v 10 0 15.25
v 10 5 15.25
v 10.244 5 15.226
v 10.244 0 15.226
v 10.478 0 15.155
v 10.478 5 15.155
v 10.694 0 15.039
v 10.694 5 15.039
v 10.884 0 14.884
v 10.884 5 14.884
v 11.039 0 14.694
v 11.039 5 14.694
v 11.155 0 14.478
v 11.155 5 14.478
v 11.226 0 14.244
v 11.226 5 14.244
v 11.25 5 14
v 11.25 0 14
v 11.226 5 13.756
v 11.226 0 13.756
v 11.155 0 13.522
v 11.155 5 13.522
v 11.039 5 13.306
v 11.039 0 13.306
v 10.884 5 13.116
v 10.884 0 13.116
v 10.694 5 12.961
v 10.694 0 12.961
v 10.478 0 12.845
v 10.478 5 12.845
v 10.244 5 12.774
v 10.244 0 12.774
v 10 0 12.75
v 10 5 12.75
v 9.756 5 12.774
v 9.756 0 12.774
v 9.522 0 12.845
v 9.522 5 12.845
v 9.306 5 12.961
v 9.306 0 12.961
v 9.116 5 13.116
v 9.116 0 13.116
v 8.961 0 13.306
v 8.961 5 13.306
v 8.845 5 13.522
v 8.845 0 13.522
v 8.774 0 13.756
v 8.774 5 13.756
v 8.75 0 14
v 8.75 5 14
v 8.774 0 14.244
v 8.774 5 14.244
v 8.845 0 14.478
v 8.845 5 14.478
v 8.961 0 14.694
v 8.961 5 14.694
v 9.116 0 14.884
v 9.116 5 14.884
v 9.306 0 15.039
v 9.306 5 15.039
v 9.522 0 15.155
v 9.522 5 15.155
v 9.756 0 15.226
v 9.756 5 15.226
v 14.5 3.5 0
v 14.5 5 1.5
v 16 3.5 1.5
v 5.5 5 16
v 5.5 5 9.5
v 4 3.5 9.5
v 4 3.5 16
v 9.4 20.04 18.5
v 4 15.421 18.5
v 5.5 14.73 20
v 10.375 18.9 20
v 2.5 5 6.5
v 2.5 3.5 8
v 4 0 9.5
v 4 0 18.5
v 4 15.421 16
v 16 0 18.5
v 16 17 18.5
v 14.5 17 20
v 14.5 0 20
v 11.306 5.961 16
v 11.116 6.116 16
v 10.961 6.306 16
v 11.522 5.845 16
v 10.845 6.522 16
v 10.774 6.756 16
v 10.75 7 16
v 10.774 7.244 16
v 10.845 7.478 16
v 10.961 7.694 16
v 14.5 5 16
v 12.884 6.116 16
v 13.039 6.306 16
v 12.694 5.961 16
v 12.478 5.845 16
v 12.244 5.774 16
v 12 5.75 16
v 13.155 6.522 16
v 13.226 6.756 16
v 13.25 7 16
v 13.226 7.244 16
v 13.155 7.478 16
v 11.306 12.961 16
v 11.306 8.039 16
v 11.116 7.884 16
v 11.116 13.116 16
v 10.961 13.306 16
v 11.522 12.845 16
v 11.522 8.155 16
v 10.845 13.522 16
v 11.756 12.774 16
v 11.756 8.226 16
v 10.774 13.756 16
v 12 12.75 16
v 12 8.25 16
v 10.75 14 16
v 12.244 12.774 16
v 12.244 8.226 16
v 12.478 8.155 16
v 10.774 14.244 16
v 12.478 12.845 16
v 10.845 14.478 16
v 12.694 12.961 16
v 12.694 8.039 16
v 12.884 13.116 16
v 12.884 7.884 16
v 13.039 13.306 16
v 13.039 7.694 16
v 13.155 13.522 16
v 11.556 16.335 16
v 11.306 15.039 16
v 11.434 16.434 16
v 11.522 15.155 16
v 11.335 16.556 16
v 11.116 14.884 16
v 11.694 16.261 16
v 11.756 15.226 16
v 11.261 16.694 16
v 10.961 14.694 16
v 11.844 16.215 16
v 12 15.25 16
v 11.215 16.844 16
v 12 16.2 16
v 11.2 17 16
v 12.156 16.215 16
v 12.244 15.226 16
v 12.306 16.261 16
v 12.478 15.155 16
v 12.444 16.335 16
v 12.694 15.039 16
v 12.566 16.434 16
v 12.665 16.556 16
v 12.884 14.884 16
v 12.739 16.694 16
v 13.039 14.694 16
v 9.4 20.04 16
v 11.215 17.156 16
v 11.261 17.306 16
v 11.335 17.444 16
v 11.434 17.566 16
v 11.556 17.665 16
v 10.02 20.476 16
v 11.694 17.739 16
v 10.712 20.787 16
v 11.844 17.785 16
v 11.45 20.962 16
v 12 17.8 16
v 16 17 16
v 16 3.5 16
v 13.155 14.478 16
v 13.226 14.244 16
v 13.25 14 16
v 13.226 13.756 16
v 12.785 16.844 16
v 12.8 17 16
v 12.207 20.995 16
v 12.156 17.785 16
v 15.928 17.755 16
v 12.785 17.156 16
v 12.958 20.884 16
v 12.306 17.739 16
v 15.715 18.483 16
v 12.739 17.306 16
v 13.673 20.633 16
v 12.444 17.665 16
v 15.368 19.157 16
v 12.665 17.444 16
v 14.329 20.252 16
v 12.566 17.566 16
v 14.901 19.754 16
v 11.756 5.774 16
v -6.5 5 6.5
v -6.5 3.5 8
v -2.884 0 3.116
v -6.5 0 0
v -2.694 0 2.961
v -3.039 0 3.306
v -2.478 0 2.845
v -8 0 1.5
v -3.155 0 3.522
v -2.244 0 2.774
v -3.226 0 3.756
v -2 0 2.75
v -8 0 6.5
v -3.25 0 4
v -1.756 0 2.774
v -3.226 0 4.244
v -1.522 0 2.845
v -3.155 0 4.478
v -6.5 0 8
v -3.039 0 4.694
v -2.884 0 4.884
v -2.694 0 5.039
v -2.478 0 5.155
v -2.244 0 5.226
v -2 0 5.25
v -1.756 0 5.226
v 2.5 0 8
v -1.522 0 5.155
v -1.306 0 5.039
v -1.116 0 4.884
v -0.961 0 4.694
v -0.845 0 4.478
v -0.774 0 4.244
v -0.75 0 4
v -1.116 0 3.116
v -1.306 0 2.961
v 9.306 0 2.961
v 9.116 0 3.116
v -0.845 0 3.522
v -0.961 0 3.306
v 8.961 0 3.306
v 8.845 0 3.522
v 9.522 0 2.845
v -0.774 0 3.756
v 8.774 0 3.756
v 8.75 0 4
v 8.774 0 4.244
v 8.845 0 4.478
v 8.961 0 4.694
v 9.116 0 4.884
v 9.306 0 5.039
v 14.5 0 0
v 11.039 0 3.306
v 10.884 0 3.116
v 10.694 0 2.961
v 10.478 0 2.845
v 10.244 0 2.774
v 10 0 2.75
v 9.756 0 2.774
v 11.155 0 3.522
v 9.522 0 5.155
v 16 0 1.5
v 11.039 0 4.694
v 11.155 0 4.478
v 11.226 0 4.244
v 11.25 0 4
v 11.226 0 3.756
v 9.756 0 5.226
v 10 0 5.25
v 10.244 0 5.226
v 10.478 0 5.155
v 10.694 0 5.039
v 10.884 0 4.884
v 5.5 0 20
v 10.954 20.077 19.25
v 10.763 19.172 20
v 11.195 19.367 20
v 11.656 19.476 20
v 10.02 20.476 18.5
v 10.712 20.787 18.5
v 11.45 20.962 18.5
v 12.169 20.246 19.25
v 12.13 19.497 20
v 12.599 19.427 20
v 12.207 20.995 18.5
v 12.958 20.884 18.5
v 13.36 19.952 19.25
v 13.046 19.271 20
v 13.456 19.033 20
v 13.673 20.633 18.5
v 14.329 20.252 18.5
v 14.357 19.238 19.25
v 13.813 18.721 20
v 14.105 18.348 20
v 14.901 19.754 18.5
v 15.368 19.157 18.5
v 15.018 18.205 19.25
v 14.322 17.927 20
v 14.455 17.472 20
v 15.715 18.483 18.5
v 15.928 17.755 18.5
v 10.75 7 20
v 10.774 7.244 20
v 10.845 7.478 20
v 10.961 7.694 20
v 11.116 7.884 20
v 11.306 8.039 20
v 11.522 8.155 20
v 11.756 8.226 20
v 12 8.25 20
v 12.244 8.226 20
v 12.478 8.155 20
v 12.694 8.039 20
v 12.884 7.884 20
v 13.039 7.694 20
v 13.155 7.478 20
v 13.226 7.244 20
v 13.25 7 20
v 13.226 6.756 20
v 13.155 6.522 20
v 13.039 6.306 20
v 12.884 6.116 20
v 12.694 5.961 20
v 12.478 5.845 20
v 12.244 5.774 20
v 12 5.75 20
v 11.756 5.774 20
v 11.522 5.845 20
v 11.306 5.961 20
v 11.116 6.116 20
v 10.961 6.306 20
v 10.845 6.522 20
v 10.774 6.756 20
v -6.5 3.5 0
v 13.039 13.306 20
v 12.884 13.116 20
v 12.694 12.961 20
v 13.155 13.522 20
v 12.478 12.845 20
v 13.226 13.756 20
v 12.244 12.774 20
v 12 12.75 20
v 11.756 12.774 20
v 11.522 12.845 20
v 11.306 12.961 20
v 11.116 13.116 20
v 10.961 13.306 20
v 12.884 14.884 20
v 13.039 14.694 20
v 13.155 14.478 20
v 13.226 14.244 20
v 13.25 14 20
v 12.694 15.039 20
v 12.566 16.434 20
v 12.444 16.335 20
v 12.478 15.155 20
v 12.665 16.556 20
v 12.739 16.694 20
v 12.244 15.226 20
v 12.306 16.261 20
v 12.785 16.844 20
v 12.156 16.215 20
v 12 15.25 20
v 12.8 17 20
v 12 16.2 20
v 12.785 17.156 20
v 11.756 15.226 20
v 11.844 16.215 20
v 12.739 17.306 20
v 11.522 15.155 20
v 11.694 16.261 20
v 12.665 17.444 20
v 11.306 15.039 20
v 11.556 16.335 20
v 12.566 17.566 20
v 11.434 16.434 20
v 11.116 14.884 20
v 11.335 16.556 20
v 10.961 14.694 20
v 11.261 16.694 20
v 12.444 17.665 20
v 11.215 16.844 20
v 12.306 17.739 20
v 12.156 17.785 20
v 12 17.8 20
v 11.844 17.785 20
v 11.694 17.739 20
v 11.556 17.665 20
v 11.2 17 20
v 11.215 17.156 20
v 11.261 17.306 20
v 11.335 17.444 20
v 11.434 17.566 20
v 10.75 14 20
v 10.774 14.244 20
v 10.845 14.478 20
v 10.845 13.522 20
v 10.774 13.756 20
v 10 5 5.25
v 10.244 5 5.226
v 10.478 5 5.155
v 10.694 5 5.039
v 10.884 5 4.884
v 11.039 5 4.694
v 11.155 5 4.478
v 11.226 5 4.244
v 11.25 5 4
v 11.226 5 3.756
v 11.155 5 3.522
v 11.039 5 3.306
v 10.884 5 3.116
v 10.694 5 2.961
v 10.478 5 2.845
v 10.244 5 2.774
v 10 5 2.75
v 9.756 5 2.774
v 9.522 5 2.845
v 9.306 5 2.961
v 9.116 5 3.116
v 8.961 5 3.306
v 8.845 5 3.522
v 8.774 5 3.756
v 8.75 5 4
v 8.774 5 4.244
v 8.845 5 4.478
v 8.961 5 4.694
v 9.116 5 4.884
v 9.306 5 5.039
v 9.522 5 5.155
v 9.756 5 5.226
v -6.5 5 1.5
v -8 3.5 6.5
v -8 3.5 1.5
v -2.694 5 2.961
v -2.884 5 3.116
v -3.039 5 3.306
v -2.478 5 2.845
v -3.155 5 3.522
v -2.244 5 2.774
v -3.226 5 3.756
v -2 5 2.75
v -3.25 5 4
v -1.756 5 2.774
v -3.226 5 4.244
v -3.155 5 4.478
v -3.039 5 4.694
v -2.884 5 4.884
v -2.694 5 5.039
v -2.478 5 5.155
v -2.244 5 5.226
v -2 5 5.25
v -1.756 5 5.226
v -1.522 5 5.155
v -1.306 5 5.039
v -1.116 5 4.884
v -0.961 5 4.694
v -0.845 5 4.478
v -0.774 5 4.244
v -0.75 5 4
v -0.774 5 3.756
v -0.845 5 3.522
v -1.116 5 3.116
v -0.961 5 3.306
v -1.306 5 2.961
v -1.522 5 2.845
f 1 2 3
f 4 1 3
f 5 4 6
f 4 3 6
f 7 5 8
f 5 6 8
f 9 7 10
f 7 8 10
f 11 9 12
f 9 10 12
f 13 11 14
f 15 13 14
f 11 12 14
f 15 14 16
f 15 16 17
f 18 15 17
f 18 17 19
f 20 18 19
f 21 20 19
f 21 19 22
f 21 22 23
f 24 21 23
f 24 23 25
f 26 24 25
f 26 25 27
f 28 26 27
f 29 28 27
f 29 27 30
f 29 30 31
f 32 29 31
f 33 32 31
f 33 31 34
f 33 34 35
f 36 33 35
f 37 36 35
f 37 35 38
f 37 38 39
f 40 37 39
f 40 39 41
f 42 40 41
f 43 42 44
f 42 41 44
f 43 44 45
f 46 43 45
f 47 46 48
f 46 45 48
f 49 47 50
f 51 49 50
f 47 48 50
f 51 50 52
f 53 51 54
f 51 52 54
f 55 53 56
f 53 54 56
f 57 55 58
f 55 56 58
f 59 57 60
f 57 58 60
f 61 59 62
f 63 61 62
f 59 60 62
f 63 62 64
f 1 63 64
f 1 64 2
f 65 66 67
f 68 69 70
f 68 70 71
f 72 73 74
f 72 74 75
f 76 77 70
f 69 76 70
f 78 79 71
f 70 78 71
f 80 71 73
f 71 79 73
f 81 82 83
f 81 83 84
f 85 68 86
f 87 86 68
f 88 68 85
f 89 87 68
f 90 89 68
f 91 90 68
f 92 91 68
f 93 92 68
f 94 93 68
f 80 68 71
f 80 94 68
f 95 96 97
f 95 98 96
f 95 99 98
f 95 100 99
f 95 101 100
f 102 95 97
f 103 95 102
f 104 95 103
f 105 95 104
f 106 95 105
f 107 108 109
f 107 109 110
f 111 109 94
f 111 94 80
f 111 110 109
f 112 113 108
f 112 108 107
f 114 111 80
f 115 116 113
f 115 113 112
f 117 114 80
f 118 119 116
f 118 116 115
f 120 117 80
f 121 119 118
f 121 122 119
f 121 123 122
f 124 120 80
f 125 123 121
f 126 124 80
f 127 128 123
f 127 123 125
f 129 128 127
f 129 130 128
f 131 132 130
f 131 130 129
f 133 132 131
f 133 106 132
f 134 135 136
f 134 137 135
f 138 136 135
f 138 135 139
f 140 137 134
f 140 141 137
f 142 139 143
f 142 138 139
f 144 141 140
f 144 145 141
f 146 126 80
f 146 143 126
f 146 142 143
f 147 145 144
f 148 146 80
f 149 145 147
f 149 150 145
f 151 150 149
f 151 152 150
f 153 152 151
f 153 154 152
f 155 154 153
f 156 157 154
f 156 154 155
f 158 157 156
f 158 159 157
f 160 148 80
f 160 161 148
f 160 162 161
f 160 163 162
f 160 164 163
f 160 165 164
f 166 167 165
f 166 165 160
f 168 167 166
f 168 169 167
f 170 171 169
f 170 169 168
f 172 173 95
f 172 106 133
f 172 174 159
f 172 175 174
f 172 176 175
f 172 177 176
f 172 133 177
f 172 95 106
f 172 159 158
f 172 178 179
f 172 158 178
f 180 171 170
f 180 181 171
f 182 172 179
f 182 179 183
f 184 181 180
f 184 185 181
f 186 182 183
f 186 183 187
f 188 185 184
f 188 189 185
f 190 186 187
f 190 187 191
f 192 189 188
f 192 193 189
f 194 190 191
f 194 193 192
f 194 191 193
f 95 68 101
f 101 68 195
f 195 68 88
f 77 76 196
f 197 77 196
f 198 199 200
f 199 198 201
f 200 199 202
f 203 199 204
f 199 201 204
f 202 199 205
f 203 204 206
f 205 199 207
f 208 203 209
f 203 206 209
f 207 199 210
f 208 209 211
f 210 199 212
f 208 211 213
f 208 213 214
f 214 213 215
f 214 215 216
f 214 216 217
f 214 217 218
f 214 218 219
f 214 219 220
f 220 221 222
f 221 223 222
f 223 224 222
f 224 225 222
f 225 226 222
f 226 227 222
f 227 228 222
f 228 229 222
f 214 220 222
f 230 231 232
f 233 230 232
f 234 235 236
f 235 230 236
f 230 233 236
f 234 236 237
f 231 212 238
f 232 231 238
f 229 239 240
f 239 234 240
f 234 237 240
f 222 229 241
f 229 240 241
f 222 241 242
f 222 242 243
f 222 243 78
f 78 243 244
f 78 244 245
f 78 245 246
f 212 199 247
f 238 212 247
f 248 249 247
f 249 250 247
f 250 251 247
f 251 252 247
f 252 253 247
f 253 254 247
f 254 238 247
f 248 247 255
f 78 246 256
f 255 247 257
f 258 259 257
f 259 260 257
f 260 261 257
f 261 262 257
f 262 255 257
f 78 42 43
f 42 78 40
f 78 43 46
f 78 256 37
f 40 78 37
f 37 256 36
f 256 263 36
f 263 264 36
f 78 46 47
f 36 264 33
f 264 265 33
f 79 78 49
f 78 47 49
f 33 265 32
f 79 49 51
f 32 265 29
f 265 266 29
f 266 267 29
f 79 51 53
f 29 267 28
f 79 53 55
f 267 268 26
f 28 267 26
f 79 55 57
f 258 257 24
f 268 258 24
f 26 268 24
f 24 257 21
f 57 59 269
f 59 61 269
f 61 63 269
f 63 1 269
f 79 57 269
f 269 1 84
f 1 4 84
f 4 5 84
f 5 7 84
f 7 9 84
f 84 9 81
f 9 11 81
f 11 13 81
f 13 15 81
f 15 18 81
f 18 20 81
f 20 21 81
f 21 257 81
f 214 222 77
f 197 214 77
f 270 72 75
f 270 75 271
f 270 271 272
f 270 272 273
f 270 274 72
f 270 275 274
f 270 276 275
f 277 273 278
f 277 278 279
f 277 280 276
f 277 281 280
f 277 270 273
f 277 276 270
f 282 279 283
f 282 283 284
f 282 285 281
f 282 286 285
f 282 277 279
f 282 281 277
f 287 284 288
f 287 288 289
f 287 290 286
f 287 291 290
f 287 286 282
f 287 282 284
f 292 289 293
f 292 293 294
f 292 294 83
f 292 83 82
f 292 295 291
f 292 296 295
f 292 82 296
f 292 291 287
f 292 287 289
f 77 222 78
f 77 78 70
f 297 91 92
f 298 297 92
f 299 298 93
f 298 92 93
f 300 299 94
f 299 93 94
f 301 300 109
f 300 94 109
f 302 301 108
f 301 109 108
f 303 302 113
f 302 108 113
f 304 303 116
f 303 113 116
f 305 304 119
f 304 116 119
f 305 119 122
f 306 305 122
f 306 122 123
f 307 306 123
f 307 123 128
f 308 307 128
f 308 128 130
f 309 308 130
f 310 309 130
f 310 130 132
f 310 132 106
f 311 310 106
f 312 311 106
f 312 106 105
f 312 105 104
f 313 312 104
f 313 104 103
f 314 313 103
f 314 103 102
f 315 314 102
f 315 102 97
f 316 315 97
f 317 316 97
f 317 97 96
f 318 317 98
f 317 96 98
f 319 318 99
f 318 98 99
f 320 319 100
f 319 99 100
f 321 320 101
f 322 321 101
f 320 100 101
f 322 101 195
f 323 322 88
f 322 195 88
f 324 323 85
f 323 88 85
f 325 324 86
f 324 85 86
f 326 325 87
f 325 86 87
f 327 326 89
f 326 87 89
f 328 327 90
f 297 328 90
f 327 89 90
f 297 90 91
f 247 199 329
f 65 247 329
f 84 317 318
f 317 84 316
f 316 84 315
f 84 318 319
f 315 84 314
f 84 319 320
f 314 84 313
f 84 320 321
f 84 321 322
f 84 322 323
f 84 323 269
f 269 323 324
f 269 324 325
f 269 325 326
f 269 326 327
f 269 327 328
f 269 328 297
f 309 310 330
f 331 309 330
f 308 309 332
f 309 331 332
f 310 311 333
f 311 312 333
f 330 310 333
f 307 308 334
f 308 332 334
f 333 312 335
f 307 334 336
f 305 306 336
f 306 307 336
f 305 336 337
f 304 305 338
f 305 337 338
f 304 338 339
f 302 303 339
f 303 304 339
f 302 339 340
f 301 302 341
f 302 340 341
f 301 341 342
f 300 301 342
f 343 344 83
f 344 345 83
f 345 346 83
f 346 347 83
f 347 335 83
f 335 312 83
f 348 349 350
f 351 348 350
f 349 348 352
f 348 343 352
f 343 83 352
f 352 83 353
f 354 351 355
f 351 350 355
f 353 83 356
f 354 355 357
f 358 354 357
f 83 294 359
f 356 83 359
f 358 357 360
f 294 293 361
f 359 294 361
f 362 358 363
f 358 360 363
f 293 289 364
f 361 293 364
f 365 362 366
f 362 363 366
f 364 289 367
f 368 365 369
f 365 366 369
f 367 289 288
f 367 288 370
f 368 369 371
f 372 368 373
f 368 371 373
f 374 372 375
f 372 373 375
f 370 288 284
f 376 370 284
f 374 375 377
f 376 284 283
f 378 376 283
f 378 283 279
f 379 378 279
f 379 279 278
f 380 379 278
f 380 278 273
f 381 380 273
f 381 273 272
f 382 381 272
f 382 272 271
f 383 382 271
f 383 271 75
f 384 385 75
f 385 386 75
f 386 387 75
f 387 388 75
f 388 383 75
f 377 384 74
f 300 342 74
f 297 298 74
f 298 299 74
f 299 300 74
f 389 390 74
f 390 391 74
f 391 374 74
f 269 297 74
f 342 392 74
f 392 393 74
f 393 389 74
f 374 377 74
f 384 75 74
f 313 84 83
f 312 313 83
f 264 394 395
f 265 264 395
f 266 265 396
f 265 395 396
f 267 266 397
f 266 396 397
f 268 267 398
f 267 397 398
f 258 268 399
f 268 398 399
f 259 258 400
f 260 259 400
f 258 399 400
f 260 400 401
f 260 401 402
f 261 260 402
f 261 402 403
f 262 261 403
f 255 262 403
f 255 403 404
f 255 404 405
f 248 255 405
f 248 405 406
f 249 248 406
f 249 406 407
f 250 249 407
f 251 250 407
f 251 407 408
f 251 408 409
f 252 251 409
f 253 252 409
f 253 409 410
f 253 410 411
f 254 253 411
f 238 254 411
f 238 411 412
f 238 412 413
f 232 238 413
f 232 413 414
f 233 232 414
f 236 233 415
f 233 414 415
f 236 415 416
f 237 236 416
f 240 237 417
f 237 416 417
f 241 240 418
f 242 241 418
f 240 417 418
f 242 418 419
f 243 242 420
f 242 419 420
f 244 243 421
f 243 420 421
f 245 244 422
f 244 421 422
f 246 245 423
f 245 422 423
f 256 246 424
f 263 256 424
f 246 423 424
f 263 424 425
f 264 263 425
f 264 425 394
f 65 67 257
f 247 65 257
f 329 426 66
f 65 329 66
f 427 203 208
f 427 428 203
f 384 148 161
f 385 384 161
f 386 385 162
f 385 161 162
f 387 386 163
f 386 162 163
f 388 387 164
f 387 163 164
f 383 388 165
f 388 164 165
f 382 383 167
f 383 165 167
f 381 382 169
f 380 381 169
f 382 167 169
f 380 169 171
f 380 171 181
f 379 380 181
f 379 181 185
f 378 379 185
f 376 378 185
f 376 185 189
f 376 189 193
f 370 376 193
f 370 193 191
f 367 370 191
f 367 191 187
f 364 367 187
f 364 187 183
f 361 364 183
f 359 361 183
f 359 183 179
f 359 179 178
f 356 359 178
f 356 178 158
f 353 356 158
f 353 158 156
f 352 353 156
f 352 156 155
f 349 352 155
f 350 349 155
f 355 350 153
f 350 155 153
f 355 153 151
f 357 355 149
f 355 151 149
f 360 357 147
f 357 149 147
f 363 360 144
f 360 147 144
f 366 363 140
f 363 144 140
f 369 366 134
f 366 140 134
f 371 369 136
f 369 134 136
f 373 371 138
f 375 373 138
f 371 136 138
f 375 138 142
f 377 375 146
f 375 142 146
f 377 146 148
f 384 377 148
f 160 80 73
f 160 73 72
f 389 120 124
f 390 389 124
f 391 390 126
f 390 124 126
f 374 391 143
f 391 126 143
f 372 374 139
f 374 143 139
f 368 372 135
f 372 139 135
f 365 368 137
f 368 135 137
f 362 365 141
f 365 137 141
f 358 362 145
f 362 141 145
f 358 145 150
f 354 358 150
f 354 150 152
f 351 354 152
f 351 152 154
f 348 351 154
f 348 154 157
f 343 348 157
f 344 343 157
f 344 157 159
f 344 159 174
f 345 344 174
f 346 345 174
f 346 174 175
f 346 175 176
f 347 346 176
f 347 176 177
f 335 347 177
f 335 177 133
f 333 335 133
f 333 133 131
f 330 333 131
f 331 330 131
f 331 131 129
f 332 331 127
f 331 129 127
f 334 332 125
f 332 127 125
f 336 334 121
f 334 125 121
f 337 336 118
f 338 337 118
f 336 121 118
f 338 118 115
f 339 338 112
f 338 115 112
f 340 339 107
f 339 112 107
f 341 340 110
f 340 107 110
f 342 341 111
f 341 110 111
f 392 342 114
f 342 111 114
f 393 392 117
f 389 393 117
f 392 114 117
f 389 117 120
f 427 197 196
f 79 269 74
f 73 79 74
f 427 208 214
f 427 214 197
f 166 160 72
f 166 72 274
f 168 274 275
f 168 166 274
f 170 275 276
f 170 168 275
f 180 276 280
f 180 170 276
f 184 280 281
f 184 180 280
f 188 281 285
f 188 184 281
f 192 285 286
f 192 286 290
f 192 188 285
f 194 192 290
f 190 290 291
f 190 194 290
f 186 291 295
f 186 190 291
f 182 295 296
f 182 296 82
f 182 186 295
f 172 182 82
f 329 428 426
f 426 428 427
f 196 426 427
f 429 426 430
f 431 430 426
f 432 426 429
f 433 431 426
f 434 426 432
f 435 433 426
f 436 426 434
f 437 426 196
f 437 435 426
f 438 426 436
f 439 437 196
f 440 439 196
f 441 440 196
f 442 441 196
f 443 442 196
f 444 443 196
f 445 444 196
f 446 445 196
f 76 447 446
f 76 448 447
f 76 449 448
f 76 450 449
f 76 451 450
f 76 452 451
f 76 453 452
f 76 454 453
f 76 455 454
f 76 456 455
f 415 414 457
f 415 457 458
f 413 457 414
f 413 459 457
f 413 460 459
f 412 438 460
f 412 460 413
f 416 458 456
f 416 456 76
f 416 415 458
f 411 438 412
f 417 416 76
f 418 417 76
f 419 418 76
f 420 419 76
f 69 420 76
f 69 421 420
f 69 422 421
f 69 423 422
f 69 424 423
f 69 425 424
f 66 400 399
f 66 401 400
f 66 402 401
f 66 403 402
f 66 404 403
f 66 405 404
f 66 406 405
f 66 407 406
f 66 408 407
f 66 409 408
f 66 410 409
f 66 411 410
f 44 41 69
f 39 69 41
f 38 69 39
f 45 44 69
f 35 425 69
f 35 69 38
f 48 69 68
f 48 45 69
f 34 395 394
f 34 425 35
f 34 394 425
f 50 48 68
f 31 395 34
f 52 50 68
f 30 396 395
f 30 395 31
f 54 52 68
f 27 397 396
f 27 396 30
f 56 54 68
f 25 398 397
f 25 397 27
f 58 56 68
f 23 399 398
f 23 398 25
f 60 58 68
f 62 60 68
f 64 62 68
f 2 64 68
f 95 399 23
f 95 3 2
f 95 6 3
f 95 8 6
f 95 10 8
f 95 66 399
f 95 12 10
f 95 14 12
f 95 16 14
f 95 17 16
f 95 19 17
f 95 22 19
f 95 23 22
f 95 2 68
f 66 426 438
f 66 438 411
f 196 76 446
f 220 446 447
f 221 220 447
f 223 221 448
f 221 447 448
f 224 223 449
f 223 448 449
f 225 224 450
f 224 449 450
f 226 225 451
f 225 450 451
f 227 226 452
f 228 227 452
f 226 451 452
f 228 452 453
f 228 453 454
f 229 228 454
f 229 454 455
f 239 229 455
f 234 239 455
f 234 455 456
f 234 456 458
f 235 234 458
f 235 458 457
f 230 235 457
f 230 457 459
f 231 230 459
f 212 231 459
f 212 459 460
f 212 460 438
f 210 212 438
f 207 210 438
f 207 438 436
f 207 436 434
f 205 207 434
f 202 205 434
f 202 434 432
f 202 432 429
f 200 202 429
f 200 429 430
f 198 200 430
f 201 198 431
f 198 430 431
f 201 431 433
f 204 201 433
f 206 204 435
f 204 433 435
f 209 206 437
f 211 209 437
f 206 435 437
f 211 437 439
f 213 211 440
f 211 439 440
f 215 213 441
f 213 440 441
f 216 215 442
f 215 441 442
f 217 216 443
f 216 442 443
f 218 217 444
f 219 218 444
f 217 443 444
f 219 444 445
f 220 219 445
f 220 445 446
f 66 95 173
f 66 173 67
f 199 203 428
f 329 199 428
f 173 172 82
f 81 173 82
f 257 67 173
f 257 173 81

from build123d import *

# Parameters (mm, degrees)
RESSALTO_EXTRUS_O1_DEPTH                = 20
ESBO_O2_W                               = 16
ESBO_O2_H                               = 16
CORTE_EXTRUS_O1_DEPTH                   = 20
CORTE_EXTRUS_O2_DEPTH                   = 34.120990323
CHANFRO2_SIZE                           = 1.5
FURO_ROSCADO_DE_M21_D                   = 1.6
ESBO_O8_W                               = 8
ESBO_O8_H                               = 5
RESSALTO_EXTRUS_O2_DEPTH                = 12
CHANFRO3_SIZE                           = 1.5
FURO_ROSCADO_DE_M31_D                   = 2.5
FURO_ROSCADO_DE_M31_DEPTH               = 8.5
FURO_ROSCADO_DE_M31_TIP                 = 0.751075774
BROCA_DE_ROSQUEAR_PARA_TARRAXA_DE_M31_D = 2.5


with BuildPart() as part:
    # Esboço1 → Ressalto-extrusão1 (new body)
    with BuildSketch(Plane.XY):
        with BuildLine():
            Line((0, 0), (0, 12))
            Line((0, 12), (9.400080843, 20.039805977))
            ThreePointArc((9.400080843, 20.039805977), (13.673368365, 20.633158174), (16, 17))
            Line((16, 17), (16, 4))
            Line((16, 4), (16, 0))
            Line((16, 0), (0, 0))
        make_face()
    extrude(amount=RESSALTO_EXTRUS_O1_DEPTH)

    # Esboço2 → Corte-extrusão1 (cut)
    with BuildSketch(Plane(origin=(16, 0, 0), x_dir=(0, 0, -1), z_dir=(1, 0, 0))):
        with Locations((-8, 13)):
            Rectangle(ESBO_O2_W, ESBO_O2_H)
    extrude(amount=-CORTE_EXTRUS_O1_DEPTH, mode=Mode.SUBTRACT)

    # Esboço3 → Corte-extrusão2 (cut, through all)
    with BuildSketch(Plane.XY.offset(20)):
        Polygon((0, 0), (4, 0), (4, 15.42116461), (0, 12), align=None)
    extrude(amount=-CORTE_EXTRUS_O2_DEPTH, mode=Mode.SUBTRACT)

    # Chanfro2
    chanfro2_edges = [part.edges().sort_by_distance(p)[0] for p in [
        (13.673368365, 20.633158174, 20),
        (6.700040421, 17.730485293, 20),
        (4, 7.710582305, 20),
        (16, 8.5, 20),
    ]]
    chamfer(chanfro2_edges, length=CHANFRO2_SIZE)

    # Furo roscado de M21 (through all)
    with Locations(Plane(origin=(12, 17, 20), x_dir=(1, 0, 0), z_dir=(0, 0, 1))):
        with Locations((0, 0)):
            Hole(FURO_ROSCADO_DE_M21_D / 2)

    # Esboço8 → Ressalto-extrusão2 (add)
    with BuildSketch(Plane.ZY.offset(-4)):
        with Locations((4, 2.5)):
            Rectangle(ESBO_O8_W, ESBO_O8_H)
    extrude(amount=RESSALTO_EXTRUS_O2_DEPTH)

    # Chanfro3
    chanfro3_edges = [part.edges().sort_by_distance(p)[0] for p in [
        (-2, 5, 8),
        (-8, 2.5, 0),
        (-8, 2.5, 8),
        (-8, 5, 4),
        (4, 5, 0),
        (16, 5, 8),
        (16, 2.5, 0),
        (4, 5, 12),
        (4, 2.5, 8),
    ]]
    chamfer(chanfro3_edges, length=CHANFRO3_SIZE)

    # Furo roscado de M31
    with Locations(Plane(origin=(-2, 0, 4), x_dir=(0, 0, -1), z_dir=(0, -1, 0))):
        with Locations((0, 0), (0, 12), (-10, 12)):
            Hole(FURO_ROSCADO_DE_M31_D / 2, depth=FURO_ROSCADO_DE_M31_DEPTH)
            with Locations((0, 0, -(FURO_ROSCADO_DE_M31_DEPTH + FURO_ROSCADO_DE_M31_TIP / 2))):  # 118° drill point
                Cone(0, FURO_ROSCADO_DE_M31_D / 2, FURO_ROSCADO_DE_M31_TIP, mode=Mode.SUBTRACT)

    # Broca de rosquear para tarraxa de M31 (through all)
    with Locations(Plane(origin=(12, 7, 20), x_dir=(1, 0, 0), z_dir=(0, 0, 1))):
        with Locations((0, 0), (0, 7)):
            Hole(BROCA_DE_ROSQUEAR_PARA_TARRAXA_DE_M31_D / 2)


solid = part.part
